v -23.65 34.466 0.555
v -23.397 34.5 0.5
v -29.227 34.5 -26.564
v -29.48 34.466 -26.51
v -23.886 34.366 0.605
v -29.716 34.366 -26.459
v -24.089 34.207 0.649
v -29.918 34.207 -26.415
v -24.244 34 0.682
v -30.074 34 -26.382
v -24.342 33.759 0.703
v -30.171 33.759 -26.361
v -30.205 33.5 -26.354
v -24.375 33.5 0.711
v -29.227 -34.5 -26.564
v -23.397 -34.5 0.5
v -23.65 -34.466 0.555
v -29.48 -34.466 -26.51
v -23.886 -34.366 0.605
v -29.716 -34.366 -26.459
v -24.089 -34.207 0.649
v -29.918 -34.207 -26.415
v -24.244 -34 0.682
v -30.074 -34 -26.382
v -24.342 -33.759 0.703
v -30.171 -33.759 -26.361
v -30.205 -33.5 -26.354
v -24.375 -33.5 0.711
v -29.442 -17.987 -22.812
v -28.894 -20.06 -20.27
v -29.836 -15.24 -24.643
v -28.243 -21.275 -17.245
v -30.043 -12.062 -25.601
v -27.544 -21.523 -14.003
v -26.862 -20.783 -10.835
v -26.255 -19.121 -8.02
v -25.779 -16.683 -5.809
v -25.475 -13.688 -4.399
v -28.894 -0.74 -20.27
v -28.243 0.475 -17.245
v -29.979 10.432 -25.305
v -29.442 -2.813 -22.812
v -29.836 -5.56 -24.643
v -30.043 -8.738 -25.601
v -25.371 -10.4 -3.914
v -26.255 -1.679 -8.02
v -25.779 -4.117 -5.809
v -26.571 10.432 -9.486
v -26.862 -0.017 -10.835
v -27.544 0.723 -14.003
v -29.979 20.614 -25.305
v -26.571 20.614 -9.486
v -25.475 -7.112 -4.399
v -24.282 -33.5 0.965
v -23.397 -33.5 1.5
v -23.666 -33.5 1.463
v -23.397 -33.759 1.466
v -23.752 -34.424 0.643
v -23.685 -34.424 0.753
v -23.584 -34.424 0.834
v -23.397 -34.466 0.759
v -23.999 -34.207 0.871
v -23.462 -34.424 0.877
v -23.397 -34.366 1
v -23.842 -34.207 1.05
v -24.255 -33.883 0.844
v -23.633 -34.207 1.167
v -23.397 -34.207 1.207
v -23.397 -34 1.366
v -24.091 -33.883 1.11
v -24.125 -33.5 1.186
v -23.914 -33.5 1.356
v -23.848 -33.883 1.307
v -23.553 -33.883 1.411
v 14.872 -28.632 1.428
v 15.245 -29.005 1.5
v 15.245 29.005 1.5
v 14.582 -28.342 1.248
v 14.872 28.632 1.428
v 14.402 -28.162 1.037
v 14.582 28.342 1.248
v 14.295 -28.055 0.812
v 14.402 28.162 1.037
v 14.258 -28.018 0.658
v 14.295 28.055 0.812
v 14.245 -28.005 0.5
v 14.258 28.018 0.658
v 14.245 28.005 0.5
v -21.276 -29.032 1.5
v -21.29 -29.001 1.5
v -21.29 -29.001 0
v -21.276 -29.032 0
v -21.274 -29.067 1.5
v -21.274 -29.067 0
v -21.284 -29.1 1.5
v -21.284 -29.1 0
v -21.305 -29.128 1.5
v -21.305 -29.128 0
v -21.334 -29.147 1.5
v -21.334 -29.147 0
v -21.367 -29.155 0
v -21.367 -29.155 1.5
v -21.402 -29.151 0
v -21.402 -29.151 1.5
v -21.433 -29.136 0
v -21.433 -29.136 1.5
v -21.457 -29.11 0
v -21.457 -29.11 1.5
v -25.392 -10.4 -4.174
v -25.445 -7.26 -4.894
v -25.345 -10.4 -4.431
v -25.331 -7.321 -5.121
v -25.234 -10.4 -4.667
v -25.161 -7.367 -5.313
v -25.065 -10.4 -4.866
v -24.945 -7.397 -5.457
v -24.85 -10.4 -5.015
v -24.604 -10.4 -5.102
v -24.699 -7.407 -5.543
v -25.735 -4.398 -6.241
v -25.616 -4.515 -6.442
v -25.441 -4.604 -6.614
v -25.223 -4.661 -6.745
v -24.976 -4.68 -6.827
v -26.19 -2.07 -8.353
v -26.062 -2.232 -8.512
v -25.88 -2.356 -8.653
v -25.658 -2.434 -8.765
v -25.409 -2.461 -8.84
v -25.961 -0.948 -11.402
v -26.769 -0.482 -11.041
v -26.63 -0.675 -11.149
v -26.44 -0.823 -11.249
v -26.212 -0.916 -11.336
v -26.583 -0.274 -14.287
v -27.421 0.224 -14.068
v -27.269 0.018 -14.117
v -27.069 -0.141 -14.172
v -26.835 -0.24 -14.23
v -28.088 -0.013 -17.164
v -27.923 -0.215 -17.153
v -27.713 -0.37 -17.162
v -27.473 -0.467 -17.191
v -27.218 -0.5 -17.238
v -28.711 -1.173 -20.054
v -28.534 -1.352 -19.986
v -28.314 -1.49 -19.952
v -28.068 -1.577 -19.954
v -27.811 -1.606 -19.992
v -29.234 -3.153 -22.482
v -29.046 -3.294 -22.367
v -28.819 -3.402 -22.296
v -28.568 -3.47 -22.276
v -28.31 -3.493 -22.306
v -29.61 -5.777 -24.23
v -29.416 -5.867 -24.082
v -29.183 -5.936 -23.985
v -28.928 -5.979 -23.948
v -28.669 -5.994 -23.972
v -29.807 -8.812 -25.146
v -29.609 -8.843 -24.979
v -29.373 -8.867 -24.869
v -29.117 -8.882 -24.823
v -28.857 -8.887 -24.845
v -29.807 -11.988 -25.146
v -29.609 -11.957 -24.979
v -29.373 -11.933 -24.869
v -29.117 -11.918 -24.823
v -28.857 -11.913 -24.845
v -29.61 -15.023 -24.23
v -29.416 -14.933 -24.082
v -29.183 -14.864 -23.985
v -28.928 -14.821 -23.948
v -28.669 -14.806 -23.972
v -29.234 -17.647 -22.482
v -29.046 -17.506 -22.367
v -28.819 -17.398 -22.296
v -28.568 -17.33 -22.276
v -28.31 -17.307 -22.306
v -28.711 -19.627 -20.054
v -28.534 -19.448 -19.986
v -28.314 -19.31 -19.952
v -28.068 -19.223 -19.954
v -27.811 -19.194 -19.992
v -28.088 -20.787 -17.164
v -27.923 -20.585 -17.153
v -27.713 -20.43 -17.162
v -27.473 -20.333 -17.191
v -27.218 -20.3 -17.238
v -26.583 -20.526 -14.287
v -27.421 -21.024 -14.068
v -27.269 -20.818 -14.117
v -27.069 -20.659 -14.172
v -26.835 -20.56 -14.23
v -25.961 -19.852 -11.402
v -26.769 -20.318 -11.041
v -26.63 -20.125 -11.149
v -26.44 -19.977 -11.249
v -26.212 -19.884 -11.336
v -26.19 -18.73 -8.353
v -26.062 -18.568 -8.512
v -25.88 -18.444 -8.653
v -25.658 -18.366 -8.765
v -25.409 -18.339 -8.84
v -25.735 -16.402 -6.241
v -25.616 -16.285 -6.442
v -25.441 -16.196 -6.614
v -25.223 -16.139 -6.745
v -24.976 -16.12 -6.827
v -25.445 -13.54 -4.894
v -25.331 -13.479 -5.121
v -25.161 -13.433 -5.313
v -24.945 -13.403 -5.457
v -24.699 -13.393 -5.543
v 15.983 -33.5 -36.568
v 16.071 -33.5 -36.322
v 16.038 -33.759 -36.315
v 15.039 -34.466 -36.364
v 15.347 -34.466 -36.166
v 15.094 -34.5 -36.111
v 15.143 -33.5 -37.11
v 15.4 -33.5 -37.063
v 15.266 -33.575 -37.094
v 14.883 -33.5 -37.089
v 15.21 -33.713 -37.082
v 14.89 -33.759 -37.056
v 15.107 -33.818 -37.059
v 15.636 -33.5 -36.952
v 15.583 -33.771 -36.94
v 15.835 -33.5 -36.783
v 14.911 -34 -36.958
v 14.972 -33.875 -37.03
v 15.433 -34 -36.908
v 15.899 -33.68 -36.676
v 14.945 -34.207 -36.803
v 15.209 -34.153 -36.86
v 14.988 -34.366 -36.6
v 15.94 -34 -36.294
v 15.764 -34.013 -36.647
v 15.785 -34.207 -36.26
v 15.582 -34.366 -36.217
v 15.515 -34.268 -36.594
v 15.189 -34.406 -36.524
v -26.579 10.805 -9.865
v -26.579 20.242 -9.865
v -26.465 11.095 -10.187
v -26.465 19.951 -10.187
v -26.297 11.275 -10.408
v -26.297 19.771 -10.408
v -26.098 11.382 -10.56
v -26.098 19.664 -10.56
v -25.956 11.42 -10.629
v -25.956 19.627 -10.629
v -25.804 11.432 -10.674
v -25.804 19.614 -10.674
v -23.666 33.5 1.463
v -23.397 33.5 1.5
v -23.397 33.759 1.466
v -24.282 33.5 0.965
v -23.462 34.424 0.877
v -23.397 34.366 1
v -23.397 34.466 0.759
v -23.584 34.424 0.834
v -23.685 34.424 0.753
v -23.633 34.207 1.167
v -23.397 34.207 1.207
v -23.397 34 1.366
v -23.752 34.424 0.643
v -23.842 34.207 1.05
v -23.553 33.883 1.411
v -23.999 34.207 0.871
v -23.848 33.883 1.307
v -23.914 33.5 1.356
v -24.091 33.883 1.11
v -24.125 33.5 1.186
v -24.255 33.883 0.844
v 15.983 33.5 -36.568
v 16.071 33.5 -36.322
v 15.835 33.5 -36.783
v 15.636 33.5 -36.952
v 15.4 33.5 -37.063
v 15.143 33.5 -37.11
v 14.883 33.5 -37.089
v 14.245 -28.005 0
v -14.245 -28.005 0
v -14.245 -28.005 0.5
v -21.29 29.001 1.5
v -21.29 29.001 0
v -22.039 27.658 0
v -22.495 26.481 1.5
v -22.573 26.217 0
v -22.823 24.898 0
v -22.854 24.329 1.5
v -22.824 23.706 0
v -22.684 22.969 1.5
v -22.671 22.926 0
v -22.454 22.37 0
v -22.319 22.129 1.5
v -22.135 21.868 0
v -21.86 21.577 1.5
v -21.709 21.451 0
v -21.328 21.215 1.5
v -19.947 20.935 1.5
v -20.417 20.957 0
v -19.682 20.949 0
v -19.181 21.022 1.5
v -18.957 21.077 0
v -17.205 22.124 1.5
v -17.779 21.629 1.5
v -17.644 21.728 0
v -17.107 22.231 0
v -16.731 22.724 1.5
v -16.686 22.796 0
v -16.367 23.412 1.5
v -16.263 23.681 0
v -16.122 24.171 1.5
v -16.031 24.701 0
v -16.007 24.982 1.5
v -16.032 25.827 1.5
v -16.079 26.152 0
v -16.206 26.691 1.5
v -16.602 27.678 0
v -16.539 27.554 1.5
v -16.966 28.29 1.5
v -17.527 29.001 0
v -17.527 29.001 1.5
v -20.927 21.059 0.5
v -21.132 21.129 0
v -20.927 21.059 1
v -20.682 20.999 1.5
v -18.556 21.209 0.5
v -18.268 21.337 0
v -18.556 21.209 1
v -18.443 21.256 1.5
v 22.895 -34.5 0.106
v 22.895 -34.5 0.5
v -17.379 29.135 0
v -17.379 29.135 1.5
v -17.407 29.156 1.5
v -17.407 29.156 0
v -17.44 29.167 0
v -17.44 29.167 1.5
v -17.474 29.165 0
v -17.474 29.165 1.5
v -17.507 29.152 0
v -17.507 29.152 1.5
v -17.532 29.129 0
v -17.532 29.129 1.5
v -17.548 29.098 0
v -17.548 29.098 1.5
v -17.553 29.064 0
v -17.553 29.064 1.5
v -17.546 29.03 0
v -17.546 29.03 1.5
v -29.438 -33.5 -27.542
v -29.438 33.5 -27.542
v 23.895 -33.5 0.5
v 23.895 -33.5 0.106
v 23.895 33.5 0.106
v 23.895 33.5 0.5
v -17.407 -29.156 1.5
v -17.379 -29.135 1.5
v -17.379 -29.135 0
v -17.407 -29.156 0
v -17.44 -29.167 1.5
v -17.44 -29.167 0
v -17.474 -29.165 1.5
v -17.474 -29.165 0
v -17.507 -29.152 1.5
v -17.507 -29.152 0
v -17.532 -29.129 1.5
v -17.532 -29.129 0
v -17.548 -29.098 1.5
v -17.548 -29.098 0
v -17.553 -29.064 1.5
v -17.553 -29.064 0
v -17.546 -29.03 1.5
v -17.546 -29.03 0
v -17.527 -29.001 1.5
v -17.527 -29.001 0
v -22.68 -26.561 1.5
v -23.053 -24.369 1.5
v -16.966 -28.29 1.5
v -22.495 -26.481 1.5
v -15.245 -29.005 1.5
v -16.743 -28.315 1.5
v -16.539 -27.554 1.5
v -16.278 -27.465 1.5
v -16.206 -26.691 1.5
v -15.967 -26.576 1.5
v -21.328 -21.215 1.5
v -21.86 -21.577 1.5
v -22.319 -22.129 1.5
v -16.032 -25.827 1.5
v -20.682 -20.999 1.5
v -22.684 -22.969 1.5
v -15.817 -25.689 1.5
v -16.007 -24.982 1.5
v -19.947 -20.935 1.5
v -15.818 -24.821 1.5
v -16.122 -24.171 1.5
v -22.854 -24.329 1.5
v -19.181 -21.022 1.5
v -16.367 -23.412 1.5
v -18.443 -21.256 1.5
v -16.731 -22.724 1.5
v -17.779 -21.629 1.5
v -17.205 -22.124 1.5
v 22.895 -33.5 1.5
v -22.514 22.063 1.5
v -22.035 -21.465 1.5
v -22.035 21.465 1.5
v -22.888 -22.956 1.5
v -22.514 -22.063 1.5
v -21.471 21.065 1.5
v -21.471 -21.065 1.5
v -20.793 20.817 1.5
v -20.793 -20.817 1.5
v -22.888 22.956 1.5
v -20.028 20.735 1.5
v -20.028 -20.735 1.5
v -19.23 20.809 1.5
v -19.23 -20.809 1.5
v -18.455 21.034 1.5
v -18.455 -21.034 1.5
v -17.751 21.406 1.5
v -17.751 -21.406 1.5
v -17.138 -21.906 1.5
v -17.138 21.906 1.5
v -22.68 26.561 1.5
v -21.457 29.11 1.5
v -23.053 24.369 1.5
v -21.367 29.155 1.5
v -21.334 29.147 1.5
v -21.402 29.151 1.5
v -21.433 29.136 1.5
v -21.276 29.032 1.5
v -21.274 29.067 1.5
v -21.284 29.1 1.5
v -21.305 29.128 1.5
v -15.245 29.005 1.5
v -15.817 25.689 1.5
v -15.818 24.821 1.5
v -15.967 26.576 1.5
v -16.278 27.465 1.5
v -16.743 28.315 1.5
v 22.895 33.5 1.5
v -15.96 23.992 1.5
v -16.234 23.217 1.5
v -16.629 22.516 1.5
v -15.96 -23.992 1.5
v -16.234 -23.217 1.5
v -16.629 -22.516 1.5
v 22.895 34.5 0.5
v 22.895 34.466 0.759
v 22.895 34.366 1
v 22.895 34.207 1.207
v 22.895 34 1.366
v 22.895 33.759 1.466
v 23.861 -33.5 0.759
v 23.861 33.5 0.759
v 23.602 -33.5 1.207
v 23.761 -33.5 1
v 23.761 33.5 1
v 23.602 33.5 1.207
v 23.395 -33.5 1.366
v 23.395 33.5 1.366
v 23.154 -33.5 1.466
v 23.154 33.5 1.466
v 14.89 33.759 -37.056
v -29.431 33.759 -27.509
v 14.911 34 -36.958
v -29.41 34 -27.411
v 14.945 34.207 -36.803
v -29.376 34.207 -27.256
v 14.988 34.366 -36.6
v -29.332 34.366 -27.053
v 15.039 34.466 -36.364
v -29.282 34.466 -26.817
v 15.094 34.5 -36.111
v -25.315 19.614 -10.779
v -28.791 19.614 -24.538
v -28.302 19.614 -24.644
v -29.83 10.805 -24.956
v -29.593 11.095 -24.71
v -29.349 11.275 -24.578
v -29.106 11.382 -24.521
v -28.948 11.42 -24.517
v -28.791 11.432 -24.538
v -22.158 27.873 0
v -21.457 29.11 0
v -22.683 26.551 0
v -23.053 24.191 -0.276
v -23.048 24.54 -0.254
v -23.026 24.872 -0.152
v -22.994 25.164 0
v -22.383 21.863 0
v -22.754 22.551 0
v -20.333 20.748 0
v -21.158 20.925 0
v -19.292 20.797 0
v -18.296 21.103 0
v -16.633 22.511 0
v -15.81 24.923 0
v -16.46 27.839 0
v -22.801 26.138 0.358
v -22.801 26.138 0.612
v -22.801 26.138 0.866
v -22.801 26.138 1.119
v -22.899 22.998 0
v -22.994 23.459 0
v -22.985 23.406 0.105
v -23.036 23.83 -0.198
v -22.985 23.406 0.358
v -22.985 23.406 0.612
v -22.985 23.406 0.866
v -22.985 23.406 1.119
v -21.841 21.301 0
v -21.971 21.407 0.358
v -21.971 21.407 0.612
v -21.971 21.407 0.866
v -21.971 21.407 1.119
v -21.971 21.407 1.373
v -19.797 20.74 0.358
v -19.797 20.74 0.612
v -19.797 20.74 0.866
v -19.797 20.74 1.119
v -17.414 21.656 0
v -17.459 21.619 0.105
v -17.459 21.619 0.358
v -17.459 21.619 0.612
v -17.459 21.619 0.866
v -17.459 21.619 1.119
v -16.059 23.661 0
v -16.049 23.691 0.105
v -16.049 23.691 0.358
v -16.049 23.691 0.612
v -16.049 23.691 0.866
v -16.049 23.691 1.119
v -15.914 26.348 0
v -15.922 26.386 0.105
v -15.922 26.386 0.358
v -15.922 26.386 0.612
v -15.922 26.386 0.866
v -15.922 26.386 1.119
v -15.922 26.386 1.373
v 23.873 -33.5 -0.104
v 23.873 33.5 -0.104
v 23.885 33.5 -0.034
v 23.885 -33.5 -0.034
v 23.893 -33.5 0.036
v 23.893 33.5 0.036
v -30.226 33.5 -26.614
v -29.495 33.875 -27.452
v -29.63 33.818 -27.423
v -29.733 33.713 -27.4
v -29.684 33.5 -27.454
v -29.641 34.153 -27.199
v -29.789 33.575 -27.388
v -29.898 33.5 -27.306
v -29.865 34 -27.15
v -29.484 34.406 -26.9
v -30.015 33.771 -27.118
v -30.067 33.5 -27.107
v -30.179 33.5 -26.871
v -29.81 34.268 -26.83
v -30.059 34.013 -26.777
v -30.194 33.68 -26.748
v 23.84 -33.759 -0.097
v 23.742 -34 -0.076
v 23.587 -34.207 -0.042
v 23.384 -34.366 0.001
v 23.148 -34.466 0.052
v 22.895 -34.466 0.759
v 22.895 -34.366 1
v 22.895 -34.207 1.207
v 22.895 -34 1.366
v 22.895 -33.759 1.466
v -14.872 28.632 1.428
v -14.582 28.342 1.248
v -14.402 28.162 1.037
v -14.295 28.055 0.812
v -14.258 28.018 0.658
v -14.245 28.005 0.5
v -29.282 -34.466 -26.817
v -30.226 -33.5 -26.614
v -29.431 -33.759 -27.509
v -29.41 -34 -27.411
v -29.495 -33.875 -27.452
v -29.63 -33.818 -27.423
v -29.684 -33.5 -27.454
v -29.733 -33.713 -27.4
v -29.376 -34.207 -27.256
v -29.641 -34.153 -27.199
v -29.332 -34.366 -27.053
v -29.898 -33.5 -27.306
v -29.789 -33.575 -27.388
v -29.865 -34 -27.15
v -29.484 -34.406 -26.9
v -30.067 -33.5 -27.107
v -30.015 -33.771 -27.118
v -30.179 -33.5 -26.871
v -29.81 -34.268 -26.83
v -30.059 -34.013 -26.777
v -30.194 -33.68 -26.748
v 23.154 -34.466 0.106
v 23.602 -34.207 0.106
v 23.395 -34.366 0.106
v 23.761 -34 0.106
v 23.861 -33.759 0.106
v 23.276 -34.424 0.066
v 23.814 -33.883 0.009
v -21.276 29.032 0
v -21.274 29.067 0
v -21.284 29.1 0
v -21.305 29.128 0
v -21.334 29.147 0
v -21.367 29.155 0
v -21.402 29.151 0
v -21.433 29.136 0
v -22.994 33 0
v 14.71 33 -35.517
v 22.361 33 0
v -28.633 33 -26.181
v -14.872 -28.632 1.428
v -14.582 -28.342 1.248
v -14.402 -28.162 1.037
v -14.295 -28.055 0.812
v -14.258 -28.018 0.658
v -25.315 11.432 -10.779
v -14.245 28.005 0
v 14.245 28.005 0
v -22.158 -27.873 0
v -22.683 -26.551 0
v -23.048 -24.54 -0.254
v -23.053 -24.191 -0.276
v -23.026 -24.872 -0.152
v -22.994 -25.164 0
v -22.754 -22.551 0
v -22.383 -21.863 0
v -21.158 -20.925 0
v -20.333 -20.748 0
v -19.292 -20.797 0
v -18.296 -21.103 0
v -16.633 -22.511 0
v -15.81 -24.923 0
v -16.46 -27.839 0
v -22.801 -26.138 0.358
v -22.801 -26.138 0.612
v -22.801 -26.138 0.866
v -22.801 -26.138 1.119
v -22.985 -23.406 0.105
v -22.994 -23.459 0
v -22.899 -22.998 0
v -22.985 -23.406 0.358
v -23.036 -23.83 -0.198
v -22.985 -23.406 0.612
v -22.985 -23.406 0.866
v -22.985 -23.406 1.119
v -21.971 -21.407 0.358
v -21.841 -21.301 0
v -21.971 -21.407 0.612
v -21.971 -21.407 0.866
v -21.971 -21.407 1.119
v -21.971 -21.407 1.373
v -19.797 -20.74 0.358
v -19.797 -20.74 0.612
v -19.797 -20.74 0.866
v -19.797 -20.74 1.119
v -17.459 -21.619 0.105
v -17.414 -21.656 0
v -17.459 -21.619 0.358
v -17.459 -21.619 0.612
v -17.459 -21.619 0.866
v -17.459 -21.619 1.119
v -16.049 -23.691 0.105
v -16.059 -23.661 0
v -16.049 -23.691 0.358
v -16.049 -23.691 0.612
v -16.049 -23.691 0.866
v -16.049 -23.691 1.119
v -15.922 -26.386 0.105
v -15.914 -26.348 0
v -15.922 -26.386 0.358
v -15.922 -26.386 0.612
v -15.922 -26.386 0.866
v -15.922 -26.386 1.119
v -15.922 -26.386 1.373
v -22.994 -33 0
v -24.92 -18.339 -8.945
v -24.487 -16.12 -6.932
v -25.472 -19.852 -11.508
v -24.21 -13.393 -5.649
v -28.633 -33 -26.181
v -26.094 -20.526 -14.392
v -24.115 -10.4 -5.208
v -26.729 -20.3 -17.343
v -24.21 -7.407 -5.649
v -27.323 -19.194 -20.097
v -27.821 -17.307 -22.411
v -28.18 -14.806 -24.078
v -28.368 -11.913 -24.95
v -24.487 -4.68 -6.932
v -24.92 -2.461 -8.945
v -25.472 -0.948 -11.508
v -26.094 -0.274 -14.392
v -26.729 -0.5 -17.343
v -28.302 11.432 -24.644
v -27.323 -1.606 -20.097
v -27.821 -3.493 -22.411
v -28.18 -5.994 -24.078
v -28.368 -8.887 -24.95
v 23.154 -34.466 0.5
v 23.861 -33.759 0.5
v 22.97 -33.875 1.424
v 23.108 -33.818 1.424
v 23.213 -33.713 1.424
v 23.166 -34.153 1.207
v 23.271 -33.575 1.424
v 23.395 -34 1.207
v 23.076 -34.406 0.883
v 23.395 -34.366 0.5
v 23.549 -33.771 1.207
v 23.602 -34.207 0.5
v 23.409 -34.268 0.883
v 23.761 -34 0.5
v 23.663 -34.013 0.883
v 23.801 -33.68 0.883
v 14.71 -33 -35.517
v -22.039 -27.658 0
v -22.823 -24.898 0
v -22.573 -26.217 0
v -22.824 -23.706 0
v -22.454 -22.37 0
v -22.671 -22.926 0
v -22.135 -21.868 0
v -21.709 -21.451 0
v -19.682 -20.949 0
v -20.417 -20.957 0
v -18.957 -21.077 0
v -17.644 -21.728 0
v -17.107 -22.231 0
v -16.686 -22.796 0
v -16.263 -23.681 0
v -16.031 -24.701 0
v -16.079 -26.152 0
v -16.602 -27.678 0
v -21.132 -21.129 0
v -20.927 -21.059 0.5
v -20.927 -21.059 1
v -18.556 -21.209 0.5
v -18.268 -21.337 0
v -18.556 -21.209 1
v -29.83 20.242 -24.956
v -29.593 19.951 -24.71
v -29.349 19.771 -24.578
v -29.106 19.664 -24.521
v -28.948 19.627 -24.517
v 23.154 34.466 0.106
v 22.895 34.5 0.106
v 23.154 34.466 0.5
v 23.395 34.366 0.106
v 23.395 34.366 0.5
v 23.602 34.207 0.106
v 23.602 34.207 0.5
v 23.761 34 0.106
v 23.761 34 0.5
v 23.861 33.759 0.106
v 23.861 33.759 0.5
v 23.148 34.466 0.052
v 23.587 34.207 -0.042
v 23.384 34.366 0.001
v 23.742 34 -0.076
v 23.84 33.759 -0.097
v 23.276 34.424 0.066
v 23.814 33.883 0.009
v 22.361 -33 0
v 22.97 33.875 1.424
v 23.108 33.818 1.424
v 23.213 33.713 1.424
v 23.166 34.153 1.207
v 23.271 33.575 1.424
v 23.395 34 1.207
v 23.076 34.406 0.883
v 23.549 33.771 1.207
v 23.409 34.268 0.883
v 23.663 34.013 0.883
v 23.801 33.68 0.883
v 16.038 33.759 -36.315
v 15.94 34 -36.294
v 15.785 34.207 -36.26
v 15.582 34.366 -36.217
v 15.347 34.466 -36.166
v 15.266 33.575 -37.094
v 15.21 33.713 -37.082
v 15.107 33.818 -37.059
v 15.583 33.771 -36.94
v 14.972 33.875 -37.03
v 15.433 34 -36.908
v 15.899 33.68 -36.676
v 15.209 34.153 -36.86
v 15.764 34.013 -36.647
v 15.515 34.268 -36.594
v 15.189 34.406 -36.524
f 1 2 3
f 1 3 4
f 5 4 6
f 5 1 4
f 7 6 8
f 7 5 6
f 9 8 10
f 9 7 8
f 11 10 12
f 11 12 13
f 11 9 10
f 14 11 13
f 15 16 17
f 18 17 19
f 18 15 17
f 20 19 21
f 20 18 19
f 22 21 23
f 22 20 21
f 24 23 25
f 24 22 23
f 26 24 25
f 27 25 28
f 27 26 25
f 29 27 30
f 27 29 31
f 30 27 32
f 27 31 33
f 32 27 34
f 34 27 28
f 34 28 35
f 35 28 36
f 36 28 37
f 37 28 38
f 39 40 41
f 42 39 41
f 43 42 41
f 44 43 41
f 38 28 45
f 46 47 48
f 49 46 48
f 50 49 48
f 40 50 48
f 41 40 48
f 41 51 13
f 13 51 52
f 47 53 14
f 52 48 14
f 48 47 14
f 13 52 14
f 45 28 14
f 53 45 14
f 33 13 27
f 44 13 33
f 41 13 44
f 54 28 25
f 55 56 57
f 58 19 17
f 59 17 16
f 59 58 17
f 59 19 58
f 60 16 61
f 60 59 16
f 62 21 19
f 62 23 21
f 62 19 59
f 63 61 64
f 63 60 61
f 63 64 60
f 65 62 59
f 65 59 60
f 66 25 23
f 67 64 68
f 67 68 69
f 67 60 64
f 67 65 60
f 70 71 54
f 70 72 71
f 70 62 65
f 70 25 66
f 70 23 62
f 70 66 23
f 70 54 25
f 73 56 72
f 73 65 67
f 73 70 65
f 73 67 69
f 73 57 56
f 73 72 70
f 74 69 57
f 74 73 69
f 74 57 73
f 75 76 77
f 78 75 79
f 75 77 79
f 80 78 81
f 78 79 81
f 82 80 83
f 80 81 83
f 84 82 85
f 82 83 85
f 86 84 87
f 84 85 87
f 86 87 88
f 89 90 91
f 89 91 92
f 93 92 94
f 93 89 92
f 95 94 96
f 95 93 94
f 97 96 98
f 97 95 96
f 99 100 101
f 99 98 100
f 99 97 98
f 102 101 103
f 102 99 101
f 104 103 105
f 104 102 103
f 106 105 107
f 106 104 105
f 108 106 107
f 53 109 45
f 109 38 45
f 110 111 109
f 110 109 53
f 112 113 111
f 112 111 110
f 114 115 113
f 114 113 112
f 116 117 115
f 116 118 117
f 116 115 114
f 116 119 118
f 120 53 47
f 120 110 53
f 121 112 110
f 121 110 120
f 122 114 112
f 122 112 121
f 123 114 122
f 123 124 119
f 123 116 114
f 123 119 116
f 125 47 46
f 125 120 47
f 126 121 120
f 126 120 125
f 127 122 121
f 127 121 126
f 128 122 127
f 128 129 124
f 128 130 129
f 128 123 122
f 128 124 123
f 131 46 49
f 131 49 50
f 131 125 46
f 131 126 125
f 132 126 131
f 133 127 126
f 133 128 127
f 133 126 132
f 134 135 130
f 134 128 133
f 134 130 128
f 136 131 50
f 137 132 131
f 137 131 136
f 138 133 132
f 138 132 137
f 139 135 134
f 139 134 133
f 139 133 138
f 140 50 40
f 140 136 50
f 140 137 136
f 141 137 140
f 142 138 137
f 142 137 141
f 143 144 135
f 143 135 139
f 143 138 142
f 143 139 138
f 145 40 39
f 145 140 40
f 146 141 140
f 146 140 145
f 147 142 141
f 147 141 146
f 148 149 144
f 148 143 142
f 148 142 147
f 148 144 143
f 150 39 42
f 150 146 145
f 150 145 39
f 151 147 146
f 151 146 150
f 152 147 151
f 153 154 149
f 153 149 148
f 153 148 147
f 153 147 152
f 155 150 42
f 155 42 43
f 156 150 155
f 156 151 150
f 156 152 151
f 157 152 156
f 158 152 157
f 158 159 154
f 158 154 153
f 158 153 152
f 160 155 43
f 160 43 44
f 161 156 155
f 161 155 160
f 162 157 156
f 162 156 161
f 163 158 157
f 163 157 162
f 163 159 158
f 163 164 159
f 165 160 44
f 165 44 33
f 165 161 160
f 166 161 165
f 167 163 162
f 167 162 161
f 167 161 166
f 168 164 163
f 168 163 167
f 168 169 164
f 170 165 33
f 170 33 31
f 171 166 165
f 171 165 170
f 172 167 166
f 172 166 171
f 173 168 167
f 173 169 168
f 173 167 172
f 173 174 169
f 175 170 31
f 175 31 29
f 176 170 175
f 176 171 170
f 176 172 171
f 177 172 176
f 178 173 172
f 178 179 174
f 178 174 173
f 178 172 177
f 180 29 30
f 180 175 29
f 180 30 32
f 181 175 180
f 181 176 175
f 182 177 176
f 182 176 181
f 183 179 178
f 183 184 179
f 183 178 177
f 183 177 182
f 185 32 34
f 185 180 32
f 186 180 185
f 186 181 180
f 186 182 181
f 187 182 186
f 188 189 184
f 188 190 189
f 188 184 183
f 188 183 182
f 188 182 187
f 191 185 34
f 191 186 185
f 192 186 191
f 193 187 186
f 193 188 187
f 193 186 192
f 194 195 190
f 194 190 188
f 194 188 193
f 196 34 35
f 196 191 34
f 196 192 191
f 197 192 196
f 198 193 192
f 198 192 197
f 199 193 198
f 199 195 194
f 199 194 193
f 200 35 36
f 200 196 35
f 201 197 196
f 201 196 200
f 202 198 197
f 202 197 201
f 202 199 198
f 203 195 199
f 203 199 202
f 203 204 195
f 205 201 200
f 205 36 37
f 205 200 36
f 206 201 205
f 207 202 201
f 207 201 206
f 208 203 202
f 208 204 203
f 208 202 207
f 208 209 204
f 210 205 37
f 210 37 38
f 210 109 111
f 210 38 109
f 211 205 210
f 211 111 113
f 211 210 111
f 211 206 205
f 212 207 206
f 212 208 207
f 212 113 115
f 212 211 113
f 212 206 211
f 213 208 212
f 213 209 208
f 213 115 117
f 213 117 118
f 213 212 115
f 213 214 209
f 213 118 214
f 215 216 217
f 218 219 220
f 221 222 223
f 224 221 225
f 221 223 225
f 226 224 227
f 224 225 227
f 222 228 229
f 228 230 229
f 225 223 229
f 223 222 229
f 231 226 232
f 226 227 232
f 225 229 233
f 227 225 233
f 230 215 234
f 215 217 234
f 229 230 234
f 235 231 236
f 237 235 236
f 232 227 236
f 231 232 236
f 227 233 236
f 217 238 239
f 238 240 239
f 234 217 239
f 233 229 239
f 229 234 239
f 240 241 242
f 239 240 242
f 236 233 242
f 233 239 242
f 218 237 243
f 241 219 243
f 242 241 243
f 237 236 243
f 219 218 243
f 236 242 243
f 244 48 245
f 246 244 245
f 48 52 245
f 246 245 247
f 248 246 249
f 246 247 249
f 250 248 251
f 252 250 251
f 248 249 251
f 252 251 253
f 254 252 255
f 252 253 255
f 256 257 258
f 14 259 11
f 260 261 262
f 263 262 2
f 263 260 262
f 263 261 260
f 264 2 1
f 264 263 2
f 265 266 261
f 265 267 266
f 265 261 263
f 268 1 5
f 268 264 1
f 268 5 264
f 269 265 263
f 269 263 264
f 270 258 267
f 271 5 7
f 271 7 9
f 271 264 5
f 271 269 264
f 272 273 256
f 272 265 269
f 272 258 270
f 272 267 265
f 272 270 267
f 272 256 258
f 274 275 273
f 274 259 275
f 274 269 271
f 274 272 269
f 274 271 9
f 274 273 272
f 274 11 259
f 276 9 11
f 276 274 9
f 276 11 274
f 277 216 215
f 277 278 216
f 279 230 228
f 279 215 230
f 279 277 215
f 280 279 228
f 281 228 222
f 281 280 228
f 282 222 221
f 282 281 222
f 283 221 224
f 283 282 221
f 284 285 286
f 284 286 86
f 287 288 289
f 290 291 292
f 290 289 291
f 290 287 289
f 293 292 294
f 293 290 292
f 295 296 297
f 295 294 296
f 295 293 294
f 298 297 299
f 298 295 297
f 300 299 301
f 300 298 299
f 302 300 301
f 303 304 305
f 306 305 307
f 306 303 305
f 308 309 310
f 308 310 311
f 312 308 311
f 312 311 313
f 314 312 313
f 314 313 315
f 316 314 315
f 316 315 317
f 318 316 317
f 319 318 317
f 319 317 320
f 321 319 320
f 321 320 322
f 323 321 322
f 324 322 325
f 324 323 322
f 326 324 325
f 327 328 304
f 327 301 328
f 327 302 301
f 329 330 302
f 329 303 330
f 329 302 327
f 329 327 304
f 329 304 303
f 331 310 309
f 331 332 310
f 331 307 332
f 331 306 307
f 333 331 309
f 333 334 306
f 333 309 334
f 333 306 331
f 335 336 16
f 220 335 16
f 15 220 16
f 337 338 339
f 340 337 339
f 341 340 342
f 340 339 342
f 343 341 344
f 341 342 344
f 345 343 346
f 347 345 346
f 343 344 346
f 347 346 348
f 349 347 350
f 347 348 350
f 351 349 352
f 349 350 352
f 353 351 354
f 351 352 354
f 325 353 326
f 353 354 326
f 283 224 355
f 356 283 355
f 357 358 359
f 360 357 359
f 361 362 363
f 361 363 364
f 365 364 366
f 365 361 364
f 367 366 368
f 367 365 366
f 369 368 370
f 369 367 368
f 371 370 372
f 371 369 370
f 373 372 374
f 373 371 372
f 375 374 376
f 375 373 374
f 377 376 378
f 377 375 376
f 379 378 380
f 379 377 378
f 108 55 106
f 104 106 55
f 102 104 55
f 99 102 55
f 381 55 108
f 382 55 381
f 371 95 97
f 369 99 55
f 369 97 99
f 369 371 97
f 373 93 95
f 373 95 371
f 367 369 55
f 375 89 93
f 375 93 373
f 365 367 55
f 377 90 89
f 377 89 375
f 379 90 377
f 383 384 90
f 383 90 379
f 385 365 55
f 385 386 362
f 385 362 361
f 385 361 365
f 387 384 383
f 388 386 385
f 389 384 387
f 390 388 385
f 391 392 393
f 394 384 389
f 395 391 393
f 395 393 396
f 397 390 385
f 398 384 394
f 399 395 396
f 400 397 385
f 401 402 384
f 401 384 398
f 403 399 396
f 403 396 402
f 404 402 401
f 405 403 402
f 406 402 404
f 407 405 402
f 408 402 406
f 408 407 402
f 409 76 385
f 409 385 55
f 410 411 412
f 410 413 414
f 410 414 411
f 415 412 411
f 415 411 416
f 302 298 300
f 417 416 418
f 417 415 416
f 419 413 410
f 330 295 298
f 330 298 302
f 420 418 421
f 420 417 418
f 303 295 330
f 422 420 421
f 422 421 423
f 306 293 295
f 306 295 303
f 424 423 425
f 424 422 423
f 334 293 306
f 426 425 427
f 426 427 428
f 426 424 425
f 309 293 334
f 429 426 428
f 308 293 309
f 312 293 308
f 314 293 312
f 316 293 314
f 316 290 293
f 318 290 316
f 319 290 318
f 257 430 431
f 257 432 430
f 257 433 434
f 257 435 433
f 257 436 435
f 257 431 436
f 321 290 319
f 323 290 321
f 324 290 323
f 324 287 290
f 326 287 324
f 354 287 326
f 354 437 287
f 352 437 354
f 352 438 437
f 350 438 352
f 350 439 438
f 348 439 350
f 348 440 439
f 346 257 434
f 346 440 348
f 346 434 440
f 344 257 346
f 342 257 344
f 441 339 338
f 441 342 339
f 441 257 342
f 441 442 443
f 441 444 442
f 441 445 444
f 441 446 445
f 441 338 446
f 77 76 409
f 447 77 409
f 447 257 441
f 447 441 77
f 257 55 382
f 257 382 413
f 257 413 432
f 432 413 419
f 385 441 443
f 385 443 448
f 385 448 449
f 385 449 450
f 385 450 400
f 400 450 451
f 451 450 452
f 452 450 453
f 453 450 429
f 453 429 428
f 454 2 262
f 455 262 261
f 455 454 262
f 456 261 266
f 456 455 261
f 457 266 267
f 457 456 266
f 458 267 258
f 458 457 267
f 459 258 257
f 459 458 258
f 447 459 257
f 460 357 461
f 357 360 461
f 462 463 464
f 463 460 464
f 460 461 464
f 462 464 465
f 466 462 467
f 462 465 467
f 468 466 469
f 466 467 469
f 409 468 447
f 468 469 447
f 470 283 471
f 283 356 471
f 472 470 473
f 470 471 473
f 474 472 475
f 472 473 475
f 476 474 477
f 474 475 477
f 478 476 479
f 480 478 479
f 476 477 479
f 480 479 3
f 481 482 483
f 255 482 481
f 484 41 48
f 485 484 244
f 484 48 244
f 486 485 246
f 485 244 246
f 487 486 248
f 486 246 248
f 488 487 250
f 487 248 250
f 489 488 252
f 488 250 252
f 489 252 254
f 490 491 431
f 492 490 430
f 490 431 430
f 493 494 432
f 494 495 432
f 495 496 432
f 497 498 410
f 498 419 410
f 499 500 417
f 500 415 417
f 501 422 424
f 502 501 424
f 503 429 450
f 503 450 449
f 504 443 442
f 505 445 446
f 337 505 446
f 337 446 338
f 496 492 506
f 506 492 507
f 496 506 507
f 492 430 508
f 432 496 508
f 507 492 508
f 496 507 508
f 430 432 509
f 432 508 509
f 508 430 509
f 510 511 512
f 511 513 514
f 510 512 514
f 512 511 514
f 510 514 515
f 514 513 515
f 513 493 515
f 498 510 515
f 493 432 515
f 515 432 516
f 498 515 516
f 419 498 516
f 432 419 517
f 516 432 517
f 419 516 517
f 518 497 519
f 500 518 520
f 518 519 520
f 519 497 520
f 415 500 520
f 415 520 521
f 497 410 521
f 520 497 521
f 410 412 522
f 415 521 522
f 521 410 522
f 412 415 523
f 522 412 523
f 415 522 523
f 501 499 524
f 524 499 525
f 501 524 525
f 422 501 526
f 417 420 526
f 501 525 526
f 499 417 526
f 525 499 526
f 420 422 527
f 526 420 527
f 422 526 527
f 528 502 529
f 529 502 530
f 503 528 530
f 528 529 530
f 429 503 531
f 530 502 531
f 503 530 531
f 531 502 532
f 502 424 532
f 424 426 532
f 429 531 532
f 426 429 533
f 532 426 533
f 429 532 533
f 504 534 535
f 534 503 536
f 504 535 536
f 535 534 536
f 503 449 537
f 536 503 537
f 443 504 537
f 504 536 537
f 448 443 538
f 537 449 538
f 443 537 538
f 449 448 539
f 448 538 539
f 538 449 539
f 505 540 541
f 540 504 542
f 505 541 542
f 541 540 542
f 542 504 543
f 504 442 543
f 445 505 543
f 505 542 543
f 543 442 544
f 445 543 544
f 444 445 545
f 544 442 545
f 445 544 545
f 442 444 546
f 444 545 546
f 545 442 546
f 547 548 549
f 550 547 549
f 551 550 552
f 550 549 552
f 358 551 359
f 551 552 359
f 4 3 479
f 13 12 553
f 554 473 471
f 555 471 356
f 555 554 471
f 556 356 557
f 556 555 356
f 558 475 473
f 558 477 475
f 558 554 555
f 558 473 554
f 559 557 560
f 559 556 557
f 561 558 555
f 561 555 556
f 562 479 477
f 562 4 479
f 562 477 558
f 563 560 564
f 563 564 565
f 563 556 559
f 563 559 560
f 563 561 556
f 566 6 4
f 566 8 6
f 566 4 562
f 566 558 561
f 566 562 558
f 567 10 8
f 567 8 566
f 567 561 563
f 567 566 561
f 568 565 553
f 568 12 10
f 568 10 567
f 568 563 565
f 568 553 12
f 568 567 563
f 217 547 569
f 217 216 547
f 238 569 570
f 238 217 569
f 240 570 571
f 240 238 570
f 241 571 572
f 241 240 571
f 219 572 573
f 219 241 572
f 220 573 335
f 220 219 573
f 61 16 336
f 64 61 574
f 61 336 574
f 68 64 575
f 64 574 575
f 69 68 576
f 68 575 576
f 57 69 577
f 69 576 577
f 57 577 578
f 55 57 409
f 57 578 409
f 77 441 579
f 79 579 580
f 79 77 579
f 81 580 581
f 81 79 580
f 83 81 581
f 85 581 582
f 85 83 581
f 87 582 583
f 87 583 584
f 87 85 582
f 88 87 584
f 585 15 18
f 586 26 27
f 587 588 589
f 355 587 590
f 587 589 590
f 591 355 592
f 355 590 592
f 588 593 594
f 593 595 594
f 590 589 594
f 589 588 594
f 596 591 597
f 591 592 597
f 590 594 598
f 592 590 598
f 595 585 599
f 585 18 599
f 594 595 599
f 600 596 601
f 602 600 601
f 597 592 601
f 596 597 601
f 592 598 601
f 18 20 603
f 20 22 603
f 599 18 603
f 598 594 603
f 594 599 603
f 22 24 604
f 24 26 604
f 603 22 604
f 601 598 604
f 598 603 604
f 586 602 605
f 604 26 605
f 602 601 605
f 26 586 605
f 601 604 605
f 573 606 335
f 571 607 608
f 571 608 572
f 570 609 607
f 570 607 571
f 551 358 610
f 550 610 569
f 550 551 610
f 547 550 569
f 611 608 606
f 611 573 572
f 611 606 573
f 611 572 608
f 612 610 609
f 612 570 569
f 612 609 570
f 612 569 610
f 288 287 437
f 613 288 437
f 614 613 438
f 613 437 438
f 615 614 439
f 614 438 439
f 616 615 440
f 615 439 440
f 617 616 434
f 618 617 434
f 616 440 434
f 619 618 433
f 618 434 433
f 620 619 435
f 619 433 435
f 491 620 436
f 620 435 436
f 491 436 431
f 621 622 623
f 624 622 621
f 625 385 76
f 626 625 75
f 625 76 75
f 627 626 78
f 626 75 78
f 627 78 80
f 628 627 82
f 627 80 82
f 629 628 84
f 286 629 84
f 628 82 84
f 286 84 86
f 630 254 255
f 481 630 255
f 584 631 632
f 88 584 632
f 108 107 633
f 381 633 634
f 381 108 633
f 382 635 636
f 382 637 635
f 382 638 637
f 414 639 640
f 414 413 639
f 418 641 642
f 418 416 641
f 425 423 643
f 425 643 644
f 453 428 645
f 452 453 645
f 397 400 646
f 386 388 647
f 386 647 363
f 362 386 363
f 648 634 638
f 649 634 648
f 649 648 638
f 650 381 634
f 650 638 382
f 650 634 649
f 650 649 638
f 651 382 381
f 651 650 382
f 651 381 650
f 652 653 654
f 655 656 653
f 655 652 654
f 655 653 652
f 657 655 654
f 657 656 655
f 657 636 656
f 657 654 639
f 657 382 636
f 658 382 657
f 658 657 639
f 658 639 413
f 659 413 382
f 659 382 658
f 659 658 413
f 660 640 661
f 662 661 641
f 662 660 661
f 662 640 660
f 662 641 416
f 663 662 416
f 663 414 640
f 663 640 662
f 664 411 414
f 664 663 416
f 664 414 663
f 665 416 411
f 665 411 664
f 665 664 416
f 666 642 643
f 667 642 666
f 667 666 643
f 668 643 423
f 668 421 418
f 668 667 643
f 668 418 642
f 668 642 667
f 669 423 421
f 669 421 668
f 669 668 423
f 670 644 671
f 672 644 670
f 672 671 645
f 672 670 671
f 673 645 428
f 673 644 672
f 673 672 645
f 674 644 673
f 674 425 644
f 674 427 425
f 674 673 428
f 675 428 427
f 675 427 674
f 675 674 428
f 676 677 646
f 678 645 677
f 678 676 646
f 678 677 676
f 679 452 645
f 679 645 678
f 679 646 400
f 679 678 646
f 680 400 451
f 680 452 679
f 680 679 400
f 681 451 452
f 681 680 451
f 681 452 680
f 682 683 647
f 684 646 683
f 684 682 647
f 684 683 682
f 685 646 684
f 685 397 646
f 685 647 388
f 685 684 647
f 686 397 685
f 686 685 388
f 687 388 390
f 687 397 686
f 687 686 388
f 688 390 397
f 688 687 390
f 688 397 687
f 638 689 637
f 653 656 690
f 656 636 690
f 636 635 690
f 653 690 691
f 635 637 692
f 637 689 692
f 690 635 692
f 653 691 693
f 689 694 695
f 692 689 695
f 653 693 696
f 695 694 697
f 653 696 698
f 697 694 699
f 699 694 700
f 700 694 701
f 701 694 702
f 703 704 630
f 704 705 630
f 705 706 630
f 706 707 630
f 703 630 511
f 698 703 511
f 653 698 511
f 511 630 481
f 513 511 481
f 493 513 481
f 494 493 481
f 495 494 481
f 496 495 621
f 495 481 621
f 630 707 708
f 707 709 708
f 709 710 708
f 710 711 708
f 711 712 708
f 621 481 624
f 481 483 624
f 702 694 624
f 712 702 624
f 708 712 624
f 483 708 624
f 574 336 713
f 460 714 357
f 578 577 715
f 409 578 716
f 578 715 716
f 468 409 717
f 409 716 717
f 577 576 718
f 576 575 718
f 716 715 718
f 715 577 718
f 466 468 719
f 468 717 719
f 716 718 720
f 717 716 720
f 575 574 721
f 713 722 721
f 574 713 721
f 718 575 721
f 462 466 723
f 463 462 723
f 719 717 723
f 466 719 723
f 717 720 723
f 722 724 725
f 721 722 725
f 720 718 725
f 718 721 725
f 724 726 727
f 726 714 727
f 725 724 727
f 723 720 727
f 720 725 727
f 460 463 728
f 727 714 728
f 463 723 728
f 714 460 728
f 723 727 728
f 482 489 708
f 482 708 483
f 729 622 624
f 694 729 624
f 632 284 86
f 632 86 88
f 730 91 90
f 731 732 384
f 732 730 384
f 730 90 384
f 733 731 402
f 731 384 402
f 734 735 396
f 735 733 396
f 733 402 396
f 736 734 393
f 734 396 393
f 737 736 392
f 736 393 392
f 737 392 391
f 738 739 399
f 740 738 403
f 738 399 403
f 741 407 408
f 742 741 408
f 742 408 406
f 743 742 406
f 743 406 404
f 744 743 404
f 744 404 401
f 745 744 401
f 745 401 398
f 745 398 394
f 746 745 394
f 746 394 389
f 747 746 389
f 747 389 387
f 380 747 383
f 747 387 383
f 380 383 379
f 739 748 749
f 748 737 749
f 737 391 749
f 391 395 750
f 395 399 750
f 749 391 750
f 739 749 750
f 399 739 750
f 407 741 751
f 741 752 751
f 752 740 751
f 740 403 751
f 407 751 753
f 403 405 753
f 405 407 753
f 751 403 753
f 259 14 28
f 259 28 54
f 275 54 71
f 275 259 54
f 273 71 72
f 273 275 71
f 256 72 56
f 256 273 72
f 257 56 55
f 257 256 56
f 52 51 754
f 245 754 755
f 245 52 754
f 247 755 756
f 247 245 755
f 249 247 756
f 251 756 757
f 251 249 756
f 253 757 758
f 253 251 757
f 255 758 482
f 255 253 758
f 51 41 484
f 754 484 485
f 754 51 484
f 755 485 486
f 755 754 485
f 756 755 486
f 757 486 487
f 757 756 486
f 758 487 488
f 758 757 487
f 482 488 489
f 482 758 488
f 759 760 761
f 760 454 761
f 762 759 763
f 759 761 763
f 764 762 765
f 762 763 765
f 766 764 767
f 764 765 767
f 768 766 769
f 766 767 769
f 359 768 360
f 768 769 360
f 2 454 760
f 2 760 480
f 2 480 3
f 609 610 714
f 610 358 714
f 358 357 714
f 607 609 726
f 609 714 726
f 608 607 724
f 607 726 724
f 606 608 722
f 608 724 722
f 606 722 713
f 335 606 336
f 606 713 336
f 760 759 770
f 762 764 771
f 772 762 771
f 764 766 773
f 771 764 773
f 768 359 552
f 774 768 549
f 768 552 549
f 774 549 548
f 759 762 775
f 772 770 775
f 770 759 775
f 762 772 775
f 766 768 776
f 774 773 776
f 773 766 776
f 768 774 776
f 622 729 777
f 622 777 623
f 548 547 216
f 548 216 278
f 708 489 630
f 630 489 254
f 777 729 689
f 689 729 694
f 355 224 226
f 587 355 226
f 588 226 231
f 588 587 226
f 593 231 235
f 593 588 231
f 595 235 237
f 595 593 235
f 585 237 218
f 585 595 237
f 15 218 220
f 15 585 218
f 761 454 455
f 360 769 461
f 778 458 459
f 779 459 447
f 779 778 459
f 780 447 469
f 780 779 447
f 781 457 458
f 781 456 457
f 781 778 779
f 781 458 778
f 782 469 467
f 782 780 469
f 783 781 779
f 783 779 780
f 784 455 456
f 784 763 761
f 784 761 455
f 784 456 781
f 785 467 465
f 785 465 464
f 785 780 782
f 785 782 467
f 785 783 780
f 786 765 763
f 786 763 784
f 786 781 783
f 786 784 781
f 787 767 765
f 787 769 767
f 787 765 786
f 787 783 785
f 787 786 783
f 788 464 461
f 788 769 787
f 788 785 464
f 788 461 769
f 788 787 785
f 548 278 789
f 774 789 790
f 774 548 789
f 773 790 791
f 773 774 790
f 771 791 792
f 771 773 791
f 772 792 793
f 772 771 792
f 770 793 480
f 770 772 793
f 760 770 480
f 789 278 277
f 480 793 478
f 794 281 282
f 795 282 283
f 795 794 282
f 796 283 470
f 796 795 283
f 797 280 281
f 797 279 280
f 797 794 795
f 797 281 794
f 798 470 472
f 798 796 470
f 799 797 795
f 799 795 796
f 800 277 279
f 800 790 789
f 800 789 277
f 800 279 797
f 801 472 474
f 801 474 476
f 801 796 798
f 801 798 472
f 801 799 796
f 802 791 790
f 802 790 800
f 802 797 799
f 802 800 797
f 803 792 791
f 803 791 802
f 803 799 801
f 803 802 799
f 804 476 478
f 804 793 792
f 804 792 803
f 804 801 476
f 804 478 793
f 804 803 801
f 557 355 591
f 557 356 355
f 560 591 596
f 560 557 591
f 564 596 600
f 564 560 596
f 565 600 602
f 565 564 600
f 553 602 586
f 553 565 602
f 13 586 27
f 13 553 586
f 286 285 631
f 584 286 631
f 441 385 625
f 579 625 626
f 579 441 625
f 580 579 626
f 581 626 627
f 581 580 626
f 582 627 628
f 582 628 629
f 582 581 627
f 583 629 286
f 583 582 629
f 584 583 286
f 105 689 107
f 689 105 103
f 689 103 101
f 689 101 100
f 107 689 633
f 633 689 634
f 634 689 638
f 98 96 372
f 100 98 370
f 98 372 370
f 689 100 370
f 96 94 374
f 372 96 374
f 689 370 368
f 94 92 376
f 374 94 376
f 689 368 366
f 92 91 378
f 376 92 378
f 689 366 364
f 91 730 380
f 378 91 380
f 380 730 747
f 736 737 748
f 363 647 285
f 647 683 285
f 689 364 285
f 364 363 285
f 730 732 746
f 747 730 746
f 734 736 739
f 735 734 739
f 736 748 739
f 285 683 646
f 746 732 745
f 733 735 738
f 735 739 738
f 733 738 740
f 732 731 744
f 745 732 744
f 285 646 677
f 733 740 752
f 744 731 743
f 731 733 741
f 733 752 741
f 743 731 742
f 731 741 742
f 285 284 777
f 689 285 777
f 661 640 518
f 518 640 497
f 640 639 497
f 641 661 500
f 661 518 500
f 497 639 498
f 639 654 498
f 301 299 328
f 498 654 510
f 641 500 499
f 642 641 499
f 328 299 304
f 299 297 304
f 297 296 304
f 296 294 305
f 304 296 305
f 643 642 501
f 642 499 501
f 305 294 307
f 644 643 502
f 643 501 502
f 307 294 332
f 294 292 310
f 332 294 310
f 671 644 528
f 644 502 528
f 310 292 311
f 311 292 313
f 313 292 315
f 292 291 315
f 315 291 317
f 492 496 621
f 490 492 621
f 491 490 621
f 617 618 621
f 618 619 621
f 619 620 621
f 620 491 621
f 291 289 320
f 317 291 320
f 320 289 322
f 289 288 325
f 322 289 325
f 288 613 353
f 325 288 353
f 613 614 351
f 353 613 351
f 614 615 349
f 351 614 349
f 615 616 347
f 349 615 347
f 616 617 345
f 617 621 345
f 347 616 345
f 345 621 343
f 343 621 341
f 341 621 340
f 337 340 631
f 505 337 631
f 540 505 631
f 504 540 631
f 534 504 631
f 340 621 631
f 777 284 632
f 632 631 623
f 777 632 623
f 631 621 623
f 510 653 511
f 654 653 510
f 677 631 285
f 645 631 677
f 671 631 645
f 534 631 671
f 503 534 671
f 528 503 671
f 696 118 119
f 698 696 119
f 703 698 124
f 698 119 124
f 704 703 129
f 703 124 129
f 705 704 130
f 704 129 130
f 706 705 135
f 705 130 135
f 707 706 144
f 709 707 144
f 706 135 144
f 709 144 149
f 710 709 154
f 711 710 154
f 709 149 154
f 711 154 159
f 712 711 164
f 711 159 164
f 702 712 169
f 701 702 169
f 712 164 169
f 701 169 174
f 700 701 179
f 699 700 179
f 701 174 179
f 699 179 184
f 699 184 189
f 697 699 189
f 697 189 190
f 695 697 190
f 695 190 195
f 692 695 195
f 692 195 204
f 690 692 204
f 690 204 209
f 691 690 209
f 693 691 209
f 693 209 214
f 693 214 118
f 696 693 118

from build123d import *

# Parameters (mm, degrees)
SKETCH1_W           = 48.100100719
SKETCH1_H           = 69
SKETCH1_W_2         = 45.100100719
SKETCH1_H_2         = 66
SKETCH1_W_3         = 31.49
SKETCH1_H_3         = 59.01
SKETCH1_W_4         = 28.49
SKETCH1_H_4         = 56.01
BOSS_EXTRUDE1_DEPTH = 1.5
BOSS_EXTRUDE2_REACH = 58.343
SKETCH2_W           = 47.337403978
SKETCH2_H           = 69
SKETCH2_W_2         = 44.337403978
SKETCH2_H_2         = 66
SKETCH2_3_W         = 47.337403978
SKETCH2_3_H         = 69
BOSS_EXTRUDE3_DEPTH = 1.5
CUT_EXTRUDE1_REACH  = 62.173
CUT_EXTRUDE2_REACH  = 74.28
SKETCH4_R           = 10.1542684
SKETCH4_W           = 14.182091892
SKETCH4_H           = 8.181976091
FILLET1_R           = 1


with BuildPart() as part:
    # Sketch1 → Boss-Extrude1 (new body)
    # profile 1 of 3: a face of its own
    with BuildSketch(Plane.XY):
        with Locations((-0.154741523, 0)):
            Rectangle(SKETCH1_W, SKETCH1_H)
        with Locations((-0.154741523, 0)):
            Rectangle(SKETCH1_W_2, SKETCH1_H_2, mode=Mode.SUBTRACT)
    # profile 2 of 3: a face of its own
    with BuildSketch(Plane.XY):
        with Locations((-0.154741523, 0)):
            Rectangle(SKETCH1_W_2, SKETCH1_H_2)
        Rectangle(SKETCH1_W_3, SKETCH1_H_3, mode=Mode.SUBTRACT)
    # profile 3 of 3: a face of its own
    with BuildSketch(Plane.XY):
        Rectangle(SKETCH1_W_3, SKETCH1_H_3)
        Rectangle(SKETCH1_W_4, SKETCH1_H_4, mode=Mode.SUBTRACT)
    extrude(amount=BOSS_EXTRUDE1_DEPTH)

    # Sketch2 → Boss-Extrude2 (add, up to next)
    with BuildSketch(Plane(origin=(-6.659238528, 0, -30.914212596), x_dir=(-0.9775766209565275, 0, 0.2105800326698086), z_dir=(-0.2105800326698086, 0, -0.9775766209565275)), mode=Mode.PRIVATE) as boss_extrude2_sk1:
        with Locations((0.309206719, 0)):
            Rectangle(SKETCH2_W, SKETCH2_H)
        with Locations((0.309206719, 0)):
            Rectangle(SKETCH2_W_2, SKETCH2_H_2, mode=Mode.SUBTRACT)
    boss_extrude2_tool1 = extrude(boss_extrude2_sk1.sketch, amount=-BOSS_EXTRUDE2_REACH, mode=Mode.PRIVATE) - part.part
    add(boss_extrude2_tool1.solids().sort_by_distance((-6.961512, -33.663231, -30.8491))[0])

    # Sketch2<3> → Boss-Extrude3 (add)
    with BuildSketch(Plane(origin=(-6.659238528, 0, -30.914212596), x_dir=(-0.9775766209565275, 0, 0.2105800326698086), z_dir=(-0.2105800326698086, 0, -0.9775766209565275))):
        with Locations((0.309206719, 0)):
            Rectangle(SKETCH2_3_W, SKETCH2_3_H)
    extrude(amount=BOSS_EXTRUDE3_DEPTH)

    # Sketch3 → Cut-Extrude1 (cut, up to next)
    with BuildSketch(Plane.XY.offset(1.5), mode=Mode.PRIVATE) as cut_extrude1_sk1:
        with BuildLine():
            ThreePointArc((-21.289731657, -29.000556332), (-21.318351701, -29.139051433), (-21.456846802, -29.110431389))
            add(Edge.make_bspline(
                [(-21.456846802, -29.110431389), (-21.76735388, -28.638163734), (-22.327297073, -27.617868396), (-23.022339766, -25.632974806), (-23.184429728, -23.286569664), (-22.349812004, -21.534860233), (-21.046397057, -20.801758586), (-19.804512561, -20.676612388), (-18.519292443, -20.934519944), (-17.050207703, -21.781257639), (-16.078766807, -23.226153574), (-15.74627905, -24.98133739), (-15.854990247, -26.382669418), (-16.279006649, -27.565007319), (-16.828982995, -28.475116006), (-17.189531054, -28.926049006), (-17.379130961, -29.134965143)],
                knots=[0, 0, 0, 0, 0.0625, 0.125, 0.25, 0.375, 0.4375, 0.5, 0.5625, 0.625, 0.75, 0.8125, 0.875, 0.9375, 0.96875, 1, 1, 1, 1], degree=3))
            ThreePointArc((-17.379130961, -29.134965143), (-17.520386483, -29.141811854), (-17.527233194, -29.000556332))
            add(Edge.make_bspline(
                [(-21.289731657, -29.000556332), (-23.500889651, -25.637481941), (-23.314330036, -20.653187448), (-16.260242518, -21.102744912), (-14.890038838, -26.094687506), (-17.527233194, -29.000556332)],
                knots=[0, 0, 0, 0, 0.438563054, 0.566022066, 1, 1, 1, 1], degree=3))
        make_face()
    cut_extrude1_tool1 = extrude(cut_extrude1_sk1.sketch, amount=-CUT_EXTRUDE1_REACH, mode=Mode.PRIVATE) & part.part
    # Sketch3 → Cut-Extrude1 (cut, up to next)
    with BuildSketch(Plane.XY.offset(1.5), mode=Mode.PRIVATE) as cut_extrude1_sk2:
        with BuildLine():
            add(Edge.make_bspline(
                [(-21.456846802, 29.110431389), (-21.76735388, 28.638163734), (-22.327297073, 27.617868396), (-23.022339766, 25.632974806), (-23.184429728, 23.286569664), (-22.349812004, 21.534860233), (-21.046397057, 20.801758586), (-19.804512561, 20.676612388), (-18.519292443, 20.934519944), (-17.050207703, 21.781257639), (-16.078766807, 23.226153574), (-15.74627905, 24.98133739), (-15.854990247, 26.382669418), (-16.279006649, 27.565007319), (-16.828982995, 28.475116006), (-17.189531054, 28.926049006), (-17.379130961, 29.134965143)],
                knots=[0, 0, 0, 0, 0.0625, 0.125, 0.25, 0.375, 0.4375, 0.5, 0.5625, 0.625, 0.75, 0.8125, 0.875, 0.9375, 0.96875, 1, 1, 1, 1], degree=3))
            ThreePointArc((-17.379130961, 29.134965143), (-17.520386483, 29.141811854), (-17.527233194, 29.000556332))
            add(Edge.make_bspline(
                [(-21.289731657, 29.000556332), (-23.500889651, 25.637481941), (-23.314330036, 20.653187448), (-16.260242518, 21.102744912), (-14.890038838, 26.094687506), (-17.527233194, 29.000556332)],
                knots=[0, 0, 0, 0, 0.438563054, 0.566022066, 1, 1, 1, 1], degree=3))
            ThreePointArc((-21.289731657, 29.000556332), (-21.318351701, 29.139051433), (-21.456846802, 29.110431389))
        make_face()
    cut_extrude1_tool2 = extrude(cut_extrude1_sk2.sketch, amount=-CUT_EXTRUDE1_REACH, mode=Mode.PRIVATE) & part.part
    add(cut_extrude1_tool1.solids().sort_by_distance((-21.379464, -29.046102, 1.5))[0], mode=Mode.SUBTRACT)
    add(cut_extrude1_tool2.solids().sort_by_distance((-19.655611, 20.861949, 1.5))[0], mode=Mode.SUBTRACT)

    # Sketch4 → Cut-Extrude2 (cut, up to next)
    with BuildSketch(Plane(origin=(-23.440242972, 0, 5.049268799), x_dir=(0.21058003266980863, 0, 0.9775766209565275), z_dir=(-0.9775766209565275, 0, 0.21058003266980863)), mode=Mode.PRIVATE) as cut_extrude2_sk1:
        with Locations((-20.323314156, -10.4)):
            Circle(SKETCH4_R)
    cut_extrude2_tool1 = extrude(cut_extrude2_sk1.sketch, amount=-CUT_EXTRUDE2_REACH, mode=Mode.PRIVATE) & part.part
    # Sketch4 → Cut-Extrude2 (cut, up to next)
    with BuildSketch(Plane(origin=(-23.440242972, 0, 5.049268799), x_dir=(0.21058003266980863, 0, 0.9775766209565275), z_dir=(-0.9775766209565275, 0, 0.21058003266980863)), mode=Mode.PRIVATE) as cut_extrude2_sk2:
        with Locations((-22.959694985, 15.523026861)):
            Rectangle(SKETCH4_W, SKETCH4_H)
    cut_extrude2_tool2 = extrude(cut_extrude2_sk2.sketch, amount=-CUT_EXTRUDE2_REACH, mode=Mode.PRIVATE) & part.part
    add(cut_extrude2_tool1.solids().sort_by_distance((-27.719927, -10.4, -14.818328))[0], mode=Mode.SUBTRACT)
    add(cut_extrude2_tool2.solids().sort_by_distance((-28.275096, 15.523027, -17.395592))[0], mode=Mode.SUBTRACT)

    # Fillet1
    fillet1_edges = [part.edges().sort_by_distance(p)[0] for p in [
        (23.895308837, 0, 0),
        (-29.858213302, -10.4, -24.744903371),
        (-29.768328979, 15.523026862, -24.327632977),
        (-28.275096292, 11.432038816, -17.395592243),
        (-26.781863605, 15.523026862, -10.463551508),
        (-28.275096292, 19.614014907, -17.395592243),
        (0, 28.005, 1.5),
        (14.245, 0, 1.5),
        (23.895308837, 34.5, 0.75),
        (23.895308837, -34.5, 0.75),
        (0, -28.005, 1.5),
        (-0.154741522, 34.5, 1.5),
        (-27.310071715, 34.5, -12.915654364),
        (-24.204791882, 0, 1.5),
        (19.877948357, 34.5, -18.649810402),
        (-27.310071715, -34.5, -12.915654364),
        (19.877948357, -34.5, -18.649810402),
        (-0.154741522, -34.5, 1.5),
        (23.895308837, 0, 1.5),
        (15.860587876, 0, -37.299620805),
        (-7.277381836, 34.5, -32.315464767),
        (-7.277381836, -34.5, -32.315464767),
        (-30.415351549, 0, -27.331308728),
        (-14.245, 0, 1.5),
    ]]
    fillet(fillet1_edges, radius=FILLET1_R)


solid = part.part
